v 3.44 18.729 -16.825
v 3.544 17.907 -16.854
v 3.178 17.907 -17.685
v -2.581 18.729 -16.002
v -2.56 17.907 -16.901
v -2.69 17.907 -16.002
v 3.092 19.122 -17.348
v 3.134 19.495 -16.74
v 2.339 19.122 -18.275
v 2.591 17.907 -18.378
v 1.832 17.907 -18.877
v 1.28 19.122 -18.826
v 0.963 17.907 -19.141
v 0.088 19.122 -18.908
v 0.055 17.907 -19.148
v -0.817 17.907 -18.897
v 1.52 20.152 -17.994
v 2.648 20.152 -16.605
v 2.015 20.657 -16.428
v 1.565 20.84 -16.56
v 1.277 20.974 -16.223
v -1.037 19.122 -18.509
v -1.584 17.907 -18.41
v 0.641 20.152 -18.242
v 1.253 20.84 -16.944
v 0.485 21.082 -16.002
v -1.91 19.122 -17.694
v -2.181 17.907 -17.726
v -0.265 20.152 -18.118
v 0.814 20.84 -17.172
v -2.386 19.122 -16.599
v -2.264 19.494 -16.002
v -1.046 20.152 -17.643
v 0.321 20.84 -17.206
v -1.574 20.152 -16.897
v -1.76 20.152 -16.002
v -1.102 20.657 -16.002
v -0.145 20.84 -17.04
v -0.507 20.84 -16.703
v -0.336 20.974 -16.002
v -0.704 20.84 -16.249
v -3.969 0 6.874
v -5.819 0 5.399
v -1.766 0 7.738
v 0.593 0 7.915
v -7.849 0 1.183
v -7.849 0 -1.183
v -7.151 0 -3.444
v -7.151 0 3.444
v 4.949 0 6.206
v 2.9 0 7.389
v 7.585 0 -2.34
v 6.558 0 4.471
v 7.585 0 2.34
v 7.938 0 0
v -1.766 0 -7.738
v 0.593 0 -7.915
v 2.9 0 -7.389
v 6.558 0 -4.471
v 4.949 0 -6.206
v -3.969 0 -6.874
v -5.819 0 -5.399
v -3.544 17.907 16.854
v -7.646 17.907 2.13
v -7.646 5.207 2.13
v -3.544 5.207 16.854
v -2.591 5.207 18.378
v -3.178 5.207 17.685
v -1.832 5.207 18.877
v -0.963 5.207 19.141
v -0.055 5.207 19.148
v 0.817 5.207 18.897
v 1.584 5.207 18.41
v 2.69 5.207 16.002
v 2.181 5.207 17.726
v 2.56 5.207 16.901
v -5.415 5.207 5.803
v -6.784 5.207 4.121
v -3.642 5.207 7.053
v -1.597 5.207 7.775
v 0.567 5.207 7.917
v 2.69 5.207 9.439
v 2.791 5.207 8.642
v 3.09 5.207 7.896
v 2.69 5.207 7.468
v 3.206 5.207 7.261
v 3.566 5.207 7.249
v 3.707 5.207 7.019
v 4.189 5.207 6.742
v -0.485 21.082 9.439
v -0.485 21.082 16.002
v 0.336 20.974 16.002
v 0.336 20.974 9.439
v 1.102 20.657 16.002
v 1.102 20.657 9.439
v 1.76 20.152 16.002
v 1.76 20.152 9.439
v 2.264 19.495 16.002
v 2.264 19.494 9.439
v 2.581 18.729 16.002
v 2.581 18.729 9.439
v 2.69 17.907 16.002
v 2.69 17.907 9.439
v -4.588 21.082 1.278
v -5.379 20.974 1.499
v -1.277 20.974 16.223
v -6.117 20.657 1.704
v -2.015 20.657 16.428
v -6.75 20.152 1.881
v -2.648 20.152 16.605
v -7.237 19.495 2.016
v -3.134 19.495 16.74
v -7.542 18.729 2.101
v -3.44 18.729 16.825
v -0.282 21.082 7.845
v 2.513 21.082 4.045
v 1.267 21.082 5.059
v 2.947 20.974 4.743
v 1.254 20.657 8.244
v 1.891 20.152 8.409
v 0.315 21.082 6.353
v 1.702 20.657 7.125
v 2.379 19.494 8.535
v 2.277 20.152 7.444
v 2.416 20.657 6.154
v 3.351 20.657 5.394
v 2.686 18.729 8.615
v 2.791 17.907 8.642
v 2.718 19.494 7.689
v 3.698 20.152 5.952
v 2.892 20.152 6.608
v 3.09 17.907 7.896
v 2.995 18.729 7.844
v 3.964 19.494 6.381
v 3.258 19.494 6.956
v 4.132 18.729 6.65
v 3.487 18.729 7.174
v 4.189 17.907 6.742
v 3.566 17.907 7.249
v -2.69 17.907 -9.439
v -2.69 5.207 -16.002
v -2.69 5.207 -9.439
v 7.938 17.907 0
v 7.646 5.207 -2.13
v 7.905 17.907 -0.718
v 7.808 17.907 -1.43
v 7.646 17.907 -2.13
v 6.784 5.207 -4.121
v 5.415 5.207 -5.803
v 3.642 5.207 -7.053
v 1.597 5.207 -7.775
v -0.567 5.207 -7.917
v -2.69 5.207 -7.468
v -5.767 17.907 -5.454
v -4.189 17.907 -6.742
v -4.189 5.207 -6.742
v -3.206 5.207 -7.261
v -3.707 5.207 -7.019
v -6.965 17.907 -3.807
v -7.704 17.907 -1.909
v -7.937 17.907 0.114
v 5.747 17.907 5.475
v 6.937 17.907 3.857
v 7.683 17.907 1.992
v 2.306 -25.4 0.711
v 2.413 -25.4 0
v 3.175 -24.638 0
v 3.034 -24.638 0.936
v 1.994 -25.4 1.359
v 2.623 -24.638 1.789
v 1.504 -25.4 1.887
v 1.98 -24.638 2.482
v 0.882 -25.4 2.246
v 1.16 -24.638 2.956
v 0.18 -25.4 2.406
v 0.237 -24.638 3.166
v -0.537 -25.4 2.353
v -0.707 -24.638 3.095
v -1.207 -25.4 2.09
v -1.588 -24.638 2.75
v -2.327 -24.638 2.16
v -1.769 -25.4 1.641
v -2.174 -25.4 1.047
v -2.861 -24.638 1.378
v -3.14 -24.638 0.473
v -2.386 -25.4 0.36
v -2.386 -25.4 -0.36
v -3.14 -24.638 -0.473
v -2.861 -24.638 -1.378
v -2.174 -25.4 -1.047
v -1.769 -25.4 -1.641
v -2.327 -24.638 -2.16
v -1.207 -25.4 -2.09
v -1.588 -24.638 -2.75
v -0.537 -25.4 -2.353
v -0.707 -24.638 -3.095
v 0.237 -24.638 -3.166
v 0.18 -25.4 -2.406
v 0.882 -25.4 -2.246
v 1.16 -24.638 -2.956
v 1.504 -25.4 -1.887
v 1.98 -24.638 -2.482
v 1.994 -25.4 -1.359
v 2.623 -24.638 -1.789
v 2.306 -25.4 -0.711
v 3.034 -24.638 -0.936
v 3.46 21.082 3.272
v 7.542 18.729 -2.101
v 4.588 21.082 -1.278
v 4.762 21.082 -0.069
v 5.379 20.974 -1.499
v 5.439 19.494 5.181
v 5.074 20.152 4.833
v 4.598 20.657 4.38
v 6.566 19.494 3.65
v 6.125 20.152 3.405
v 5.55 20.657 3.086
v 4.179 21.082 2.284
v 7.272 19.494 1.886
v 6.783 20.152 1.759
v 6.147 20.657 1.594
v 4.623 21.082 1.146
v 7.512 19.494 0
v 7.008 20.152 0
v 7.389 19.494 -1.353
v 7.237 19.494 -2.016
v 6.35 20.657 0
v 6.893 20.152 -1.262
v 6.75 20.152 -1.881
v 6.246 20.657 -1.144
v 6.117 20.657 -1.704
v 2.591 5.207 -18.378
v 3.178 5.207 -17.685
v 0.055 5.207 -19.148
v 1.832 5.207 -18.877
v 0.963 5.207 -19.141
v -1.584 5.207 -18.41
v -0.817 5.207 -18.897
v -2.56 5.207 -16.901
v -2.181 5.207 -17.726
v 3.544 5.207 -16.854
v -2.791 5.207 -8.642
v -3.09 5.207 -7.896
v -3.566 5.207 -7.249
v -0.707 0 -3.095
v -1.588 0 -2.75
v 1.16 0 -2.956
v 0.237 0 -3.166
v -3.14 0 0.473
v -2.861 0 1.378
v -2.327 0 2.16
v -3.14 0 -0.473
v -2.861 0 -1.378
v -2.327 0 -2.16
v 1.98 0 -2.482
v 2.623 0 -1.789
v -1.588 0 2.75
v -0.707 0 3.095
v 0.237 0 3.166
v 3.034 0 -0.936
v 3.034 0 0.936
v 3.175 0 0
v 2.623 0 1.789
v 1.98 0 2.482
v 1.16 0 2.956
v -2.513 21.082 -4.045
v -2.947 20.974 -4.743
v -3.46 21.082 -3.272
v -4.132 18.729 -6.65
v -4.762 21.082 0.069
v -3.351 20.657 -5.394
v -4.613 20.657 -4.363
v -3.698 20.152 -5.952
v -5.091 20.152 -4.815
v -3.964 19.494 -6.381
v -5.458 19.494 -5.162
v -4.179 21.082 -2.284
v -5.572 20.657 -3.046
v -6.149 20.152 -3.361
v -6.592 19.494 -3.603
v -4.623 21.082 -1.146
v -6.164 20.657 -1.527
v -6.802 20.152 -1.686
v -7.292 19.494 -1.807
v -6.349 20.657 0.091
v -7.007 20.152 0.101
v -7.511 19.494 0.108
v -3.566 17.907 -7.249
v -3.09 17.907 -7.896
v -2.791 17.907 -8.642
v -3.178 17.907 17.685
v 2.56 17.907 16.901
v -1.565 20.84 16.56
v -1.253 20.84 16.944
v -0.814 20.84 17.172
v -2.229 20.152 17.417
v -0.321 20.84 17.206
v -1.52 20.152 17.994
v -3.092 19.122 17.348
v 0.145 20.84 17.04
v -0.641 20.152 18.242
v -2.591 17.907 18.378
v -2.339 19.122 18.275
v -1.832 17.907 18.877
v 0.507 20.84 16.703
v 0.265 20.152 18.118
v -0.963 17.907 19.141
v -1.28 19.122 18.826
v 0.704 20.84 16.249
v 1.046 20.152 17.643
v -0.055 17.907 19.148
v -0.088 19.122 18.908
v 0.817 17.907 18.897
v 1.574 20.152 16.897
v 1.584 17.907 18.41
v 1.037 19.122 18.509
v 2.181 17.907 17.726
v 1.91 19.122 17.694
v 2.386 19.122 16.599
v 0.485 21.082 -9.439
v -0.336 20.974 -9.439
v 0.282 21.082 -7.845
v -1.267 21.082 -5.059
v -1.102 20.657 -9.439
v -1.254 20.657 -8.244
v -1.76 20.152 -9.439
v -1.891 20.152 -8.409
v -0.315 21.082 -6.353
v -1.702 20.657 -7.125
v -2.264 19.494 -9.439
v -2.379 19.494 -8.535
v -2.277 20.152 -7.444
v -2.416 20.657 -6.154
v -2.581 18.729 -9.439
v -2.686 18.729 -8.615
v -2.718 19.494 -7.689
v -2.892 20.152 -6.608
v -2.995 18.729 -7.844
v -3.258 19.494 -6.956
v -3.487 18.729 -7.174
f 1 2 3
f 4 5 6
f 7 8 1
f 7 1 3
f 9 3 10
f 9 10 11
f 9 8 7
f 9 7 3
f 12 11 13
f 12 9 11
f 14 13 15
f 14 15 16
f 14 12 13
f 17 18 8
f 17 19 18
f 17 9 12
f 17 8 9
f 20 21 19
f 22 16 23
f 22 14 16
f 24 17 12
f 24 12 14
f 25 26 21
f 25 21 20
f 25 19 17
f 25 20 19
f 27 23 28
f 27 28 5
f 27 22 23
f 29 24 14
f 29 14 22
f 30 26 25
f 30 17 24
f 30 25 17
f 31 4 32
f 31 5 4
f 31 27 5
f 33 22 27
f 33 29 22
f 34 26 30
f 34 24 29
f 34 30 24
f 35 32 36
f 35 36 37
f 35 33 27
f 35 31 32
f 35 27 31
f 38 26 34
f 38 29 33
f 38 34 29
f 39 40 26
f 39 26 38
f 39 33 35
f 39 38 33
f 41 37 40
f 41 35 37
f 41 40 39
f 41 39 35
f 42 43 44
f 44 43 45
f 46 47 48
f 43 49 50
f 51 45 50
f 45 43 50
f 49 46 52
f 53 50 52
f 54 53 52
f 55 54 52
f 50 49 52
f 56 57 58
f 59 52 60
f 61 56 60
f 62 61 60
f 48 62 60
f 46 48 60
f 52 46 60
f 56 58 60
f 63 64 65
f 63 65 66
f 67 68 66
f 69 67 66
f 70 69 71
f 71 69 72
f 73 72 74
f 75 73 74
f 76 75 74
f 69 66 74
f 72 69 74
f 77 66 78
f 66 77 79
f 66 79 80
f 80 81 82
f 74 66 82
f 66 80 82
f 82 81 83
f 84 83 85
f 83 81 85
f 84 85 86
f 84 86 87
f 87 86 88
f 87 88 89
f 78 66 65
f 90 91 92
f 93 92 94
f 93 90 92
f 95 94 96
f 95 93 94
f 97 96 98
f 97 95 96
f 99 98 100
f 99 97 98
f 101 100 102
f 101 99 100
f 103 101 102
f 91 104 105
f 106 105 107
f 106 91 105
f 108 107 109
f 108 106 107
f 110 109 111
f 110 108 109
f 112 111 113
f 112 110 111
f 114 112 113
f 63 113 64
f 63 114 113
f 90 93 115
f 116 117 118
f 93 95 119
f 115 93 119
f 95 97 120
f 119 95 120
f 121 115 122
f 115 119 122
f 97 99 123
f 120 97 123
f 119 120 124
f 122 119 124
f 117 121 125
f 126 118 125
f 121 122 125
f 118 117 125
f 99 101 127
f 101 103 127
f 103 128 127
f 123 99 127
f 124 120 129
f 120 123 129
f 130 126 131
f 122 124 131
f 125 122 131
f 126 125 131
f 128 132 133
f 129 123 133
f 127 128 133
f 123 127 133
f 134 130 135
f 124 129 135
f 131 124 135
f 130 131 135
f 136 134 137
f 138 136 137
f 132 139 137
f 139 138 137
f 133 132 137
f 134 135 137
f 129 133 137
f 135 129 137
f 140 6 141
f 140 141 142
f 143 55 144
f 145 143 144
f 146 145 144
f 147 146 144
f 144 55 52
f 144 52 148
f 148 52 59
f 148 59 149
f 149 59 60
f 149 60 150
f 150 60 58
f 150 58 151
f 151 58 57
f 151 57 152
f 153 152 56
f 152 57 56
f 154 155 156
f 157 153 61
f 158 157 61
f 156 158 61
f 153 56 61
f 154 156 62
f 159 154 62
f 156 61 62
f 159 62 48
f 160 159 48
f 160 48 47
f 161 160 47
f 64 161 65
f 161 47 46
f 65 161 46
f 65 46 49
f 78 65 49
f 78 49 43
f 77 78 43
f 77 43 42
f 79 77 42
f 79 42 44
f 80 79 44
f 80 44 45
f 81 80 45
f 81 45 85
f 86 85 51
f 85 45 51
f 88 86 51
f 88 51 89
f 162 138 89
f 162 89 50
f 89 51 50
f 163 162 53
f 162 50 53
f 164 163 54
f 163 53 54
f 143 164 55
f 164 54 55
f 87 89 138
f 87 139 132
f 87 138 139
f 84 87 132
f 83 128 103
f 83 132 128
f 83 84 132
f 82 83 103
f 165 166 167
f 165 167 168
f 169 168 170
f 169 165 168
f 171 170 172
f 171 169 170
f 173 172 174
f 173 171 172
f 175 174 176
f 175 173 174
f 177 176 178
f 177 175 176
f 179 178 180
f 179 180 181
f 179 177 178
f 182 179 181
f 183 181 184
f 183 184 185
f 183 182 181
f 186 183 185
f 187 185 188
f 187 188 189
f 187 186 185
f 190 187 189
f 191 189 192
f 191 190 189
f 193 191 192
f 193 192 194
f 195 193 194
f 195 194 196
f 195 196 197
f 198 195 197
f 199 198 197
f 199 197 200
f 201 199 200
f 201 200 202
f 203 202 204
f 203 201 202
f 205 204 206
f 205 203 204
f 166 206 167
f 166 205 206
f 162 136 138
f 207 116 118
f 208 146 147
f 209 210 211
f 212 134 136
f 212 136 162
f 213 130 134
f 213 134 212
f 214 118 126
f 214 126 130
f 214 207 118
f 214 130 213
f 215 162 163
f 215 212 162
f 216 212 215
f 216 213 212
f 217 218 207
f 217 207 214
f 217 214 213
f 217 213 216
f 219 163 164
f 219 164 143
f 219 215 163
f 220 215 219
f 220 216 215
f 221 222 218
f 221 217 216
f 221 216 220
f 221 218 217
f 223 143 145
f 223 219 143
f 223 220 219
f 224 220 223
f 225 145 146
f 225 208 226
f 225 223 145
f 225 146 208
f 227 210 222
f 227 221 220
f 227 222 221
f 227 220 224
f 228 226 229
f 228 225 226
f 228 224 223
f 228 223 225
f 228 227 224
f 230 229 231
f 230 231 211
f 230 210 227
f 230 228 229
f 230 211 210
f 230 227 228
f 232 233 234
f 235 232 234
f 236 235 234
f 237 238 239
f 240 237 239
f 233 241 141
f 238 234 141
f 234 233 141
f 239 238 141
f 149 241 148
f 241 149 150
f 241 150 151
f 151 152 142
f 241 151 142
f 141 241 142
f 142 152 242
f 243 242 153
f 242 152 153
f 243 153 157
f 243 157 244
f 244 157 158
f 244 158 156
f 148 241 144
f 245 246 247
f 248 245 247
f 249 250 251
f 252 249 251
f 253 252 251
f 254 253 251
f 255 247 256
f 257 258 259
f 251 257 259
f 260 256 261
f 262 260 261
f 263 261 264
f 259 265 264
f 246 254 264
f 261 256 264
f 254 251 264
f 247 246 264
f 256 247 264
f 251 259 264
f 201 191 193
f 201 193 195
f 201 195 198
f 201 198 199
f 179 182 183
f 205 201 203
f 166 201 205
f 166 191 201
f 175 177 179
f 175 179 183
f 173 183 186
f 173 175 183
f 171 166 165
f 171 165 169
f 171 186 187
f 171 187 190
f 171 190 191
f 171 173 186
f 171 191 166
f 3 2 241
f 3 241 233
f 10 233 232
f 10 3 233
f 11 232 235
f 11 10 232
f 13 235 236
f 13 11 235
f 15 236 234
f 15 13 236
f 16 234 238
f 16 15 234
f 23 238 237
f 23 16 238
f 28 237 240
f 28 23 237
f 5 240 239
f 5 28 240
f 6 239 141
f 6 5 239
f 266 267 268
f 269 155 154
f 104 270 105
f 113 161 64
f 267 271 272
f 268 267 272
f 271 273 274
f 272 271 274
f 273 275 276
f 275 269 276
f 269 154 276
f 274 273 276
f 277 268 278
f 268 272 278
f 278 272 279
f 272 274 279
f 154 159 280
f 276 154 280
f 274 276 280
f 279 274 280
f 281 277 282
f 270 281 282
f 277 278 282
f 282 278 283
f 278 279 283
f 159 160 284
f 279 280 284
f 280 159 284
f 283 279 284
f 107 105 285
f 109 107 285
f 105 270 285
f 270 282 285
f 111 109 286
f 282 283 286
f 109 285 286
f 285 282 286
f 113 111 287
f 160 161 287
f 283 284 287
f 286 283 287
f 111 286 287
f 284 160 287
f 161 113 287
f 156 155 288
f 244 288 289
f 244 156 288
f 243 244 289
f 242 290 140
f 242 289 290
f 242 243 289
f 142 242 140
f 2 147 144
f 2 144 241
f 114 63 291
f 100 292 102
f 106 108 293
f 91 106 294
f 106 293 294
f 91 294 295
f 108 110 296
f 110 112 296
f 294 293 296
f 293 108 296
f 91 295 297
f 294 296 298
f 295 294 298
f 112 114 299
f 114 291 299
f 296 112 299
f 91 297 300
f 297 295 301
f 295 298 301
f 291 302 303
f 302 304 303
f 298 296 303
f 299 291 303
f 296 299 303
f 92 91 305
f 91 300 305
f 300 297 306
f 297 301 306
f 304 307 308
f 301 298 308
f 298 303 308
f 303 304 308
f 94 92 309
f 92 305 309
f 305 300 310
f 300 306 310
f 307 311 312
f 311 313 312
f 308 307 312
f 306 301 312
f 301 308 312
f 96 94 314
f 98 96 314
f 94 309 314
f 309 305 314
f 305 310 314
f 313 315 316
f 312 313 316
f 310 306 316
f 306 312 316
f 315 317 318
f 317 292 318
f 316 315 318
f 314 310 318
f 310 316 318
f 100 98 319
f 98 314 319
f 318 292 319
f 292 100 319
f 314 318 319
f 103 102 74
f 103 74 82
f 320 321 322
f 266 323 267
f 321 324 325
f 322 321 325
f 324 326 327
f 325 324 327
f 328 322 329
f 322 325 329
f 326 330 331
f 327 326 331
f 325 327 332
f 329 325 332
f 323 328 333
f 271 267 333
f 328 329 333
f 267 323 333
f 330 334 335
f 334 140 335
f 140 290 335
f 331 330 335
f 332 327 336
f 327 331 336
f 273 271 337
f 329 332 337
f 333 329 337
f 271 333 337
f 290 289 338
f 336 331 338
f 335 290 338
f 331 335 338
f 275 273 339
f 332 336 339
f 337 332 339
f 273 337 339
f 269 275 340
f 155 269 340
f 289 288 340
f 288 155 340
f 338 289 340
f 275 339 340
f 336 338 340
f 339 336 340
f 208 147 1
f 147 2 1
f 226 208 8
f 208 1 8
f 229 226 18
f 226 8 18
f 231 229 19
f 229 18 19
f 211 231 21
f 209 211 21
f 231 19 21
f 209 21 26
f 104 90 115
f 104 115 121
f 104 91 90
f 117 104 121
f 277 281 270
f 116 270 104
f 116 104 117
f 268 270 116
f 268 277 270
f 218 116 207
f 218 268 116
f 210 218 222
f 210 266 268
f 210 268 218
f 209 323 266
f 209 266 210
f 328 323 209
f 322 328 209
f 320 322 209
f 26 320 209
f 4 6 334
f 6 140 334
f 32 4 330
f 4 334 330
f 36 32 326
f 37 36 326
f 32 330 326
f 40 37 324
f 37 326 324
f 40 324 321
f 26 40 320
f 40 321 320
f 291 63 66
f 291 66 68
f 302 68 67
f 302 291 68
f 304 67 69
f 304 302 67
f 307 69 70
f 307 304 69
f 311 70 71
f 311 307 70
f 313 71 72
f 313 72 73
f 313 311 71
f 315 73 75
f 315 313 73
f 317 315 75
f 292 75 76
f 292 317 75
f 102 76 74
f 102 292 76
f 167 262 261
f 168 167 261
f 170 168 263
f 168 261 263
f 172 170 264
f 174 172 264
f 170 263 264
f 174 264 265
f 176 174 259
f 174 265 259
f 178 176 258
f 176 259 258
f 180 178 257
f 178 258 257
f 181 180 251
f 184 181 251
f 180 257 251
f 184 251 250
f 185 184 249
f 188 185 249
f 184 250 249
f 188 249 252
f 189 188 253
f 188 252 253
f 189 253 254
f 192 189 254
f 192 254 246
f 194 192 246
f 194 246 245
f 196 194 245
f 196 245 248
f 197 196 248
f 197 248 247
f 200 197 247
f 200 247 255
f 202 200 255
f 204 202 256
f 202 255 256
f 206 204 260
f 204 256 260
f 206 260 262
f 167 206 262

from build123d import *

# Parameters (mm, degrees)
SKETCH1_R         = 7.9375
EXTRUDE1_DEPTH    = 21.082
EXTRUDE2_DEPTH    = 15.875
CIRPATTERN4_COUNT = 2
FILLET1_R         = 3.175
SKETCH7_R         = 3.175
EXTRUDE3_DEPTH    = 25.4
CHAMFER1_SIZE     = 0.762


with BuildPart() as part:
    # Sketch1 → Extrude1 (new body)
    with BuildSketch(Plane(origin=(0, 0, 0), x_dir=(1, 0, 0), z_dir=(0, 1, 0))):
        Circle(SKETCH1_R)
    extrude(amount=EXTRUDE1_DEPTH)

    # Sketch2 → Extrude2 (add)
    with BuildSketch(Plane(origin=(0, 21.082, 0), x_dir=(-1, 0, 0), z_dir=(0, 1, 0))):
        with BuildLine():
            Line((2.68951844, -16.002), (2.68951844, -7.467958008))
            ThreePointArc((2.68951844, -7.467958008), (-3.642086896, -7.052595926), (-7.64626831, -2.130372546))
            Line((-7.64626831, -2.130372546), (-3.543988884, -16.854149018))
            ThreePointArc((-3.543988884, -16.854149018), (-0.055444209, -19.147742023), (2.68951844, -16.002))
        make_face()
    extrude2 = extrude(amount=-EXTRUDE2_DEPTH)

    # CirPattern4: Extrude2 ×2 about axis
    cirpattern4_axis = Axis((0, 0, 0), (0, 1, 0))
    for i in range(1, CIRPATTERN4_COUNT):
        add(extrude2.rotate(cirpattern4_axis, i * 360 / CIRPATTERN4_COUNT))

    # Fillet1
    fillet1_edges = [part.edges().sort_by_distance(p)[0] for p in [
        (6.494303614, 21.082, 4.563762353),
        (2.68951844, 13.1445, 7.467958008),
        (-0.055444209, 21.082, 19.147742023),
        (2.68951844, 21.082, 11.734979004),
        (-5.595128597, 21.082, 9.492260782),
        (-7.052595926, 21.082, -3.642086896),
        (-2.68951844, 13.1445, -7.467958008),
        (0.055444209, 21.082, -19.147742023),
        (-2.68951844, 21.082, -11.734979004),
        (5.595128597, 21.082, -9.492260782),
    ]]
    fillet(fillet1_edges, radius=FILLET1_R)


with BuildPart() as body_2:
    # Sketch7 → Extrude3 (new body)
    with BuildSketch(Plane.XZ):
        Circle(SKETCH7_R)
    extrude(amount=EXTRUDE3_DEPTH)

    # Chamfer1
    chamfer1_edges = [body_2.edges().sort_by_distance(p)[0] for p in [
        (-3.175, -25.4, 0),
    ]]
    chamfer(chamfer1_edges, length=CHAMFER1_SIZE)


solid = Compound([part.part, body_2.part])
